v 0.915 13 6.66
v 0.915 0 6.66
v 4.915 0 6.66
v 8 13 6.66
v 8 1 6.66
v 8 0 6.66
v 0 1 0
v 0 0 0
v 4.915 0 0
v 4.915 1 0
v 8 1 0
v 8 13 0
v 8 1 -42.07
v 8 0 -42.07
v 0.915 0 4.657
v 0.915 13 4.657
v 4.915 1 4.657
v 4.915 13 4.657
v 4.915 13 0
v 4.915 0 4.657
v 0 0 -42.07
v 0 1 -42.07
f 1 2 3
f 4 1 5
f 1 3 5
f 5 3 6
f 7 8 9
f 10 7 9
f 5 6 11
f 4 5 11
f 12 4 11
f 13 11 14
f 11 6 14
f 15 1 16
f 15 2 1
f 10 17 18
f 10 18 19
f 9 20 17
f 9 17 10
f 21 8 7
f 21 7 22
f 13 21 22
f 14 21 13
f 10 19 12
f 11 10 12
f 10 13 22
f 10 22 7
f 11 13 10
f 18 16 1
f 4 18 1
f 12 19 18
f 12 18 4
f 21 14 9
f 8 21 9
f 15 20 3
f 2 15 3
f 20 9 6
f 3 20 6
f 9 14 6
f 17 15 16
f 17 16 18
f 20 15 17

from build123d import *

# Parameters (mm, degrees)
SCHIZZO1_W                   = 8
SCHIZZO1_H                   = 42.07
ESTRUSIONE_ESTRUSIONE1_DEPTH = 1
SCHIZZO2_W                   = 3.084803914
SCHIZZO2_H                   = 1
ESTRUSIONE_ESTRUSIONE2_DEPTH = 4.66
SCHIZZO3_W                   = 3.084803914
SCHIZZO3_H                   = 1
ESTRUSIONE_ESTRUSIONE3_DEPTH = 2
SCHIZZO4_W                   = 2.003143521
SCHIZZO4_H                   = 1
ESTRUSIONE_ESTRUSIONE4_DEPTH = 4
SCHIZZO5_W                   = 7.084803914
SCHIZZO5_H                   = 2.003143521
ESTRUSIONE_ESTRUSIONE5_DEPTH = 12
SCHIZZO7_W                   = 3.084803914
SCHIZZO7_H                   = 4.656856479
ESTRUSIONE_ESTRUSIONE7_DEPTH = 12


with BuildPart() as part:
    # Schizzo1 → Estrusione-Estrusione1 (new body)
    with BuildSketch(Plane(origin=(0, 0, 0), x_dir=(1, 0, 0), z_dir=(0, 1, 0))):
        with Locations((4, 21.035)):
            Rectangle(SCHIZZO1_W, SCHIZZO1_H)
    extrude(amount=ESTRUSIONE_ESTRUSIONE1_DEPTH)

    # Schizzo2 → Estrusione-Estrusione2 (add)
    with BuildSketch(Plane.XY):
        with Locations((6.457598043, 0.5)):
            Rectangle(SCHIZZO2_W, SCHIZZO2_H)
    extrude(amount=ESTRUSIONE_ESTRUSIONE2_DEPTH)

    # Schizzo3 → Estrusione-Estrusione3 (add)
    with BuildSketch(Plane.XY.offset(4.66)):
        with Locations((6.457598043, 0.5)):
            Rectangle(SCHIZZO3_W, SCHIZZO3_H)
    extrude(amount=ESTRUSIONE_ESTRUSIONE3_DEPTH)

    # Schizzo4 → Estrusione-Estrusione4 (add)
    with BuildSketch(Plane.ZY.offset(-4.915196086)):
        with Locations((5.65842824, 0.5)):
            Rectangle(SCHIZZO4_W, SCHIZZO4_H)
    extrude(amount=ESTRUSIONE_ESTRUSIONE4_DEPTH)

    # Schizzo5 → Estrusione-Estrusione5 (add)
    with BuildSketch(Plane(origin=(0, 1, 0), x_dir=(1, 0, 0), z_dir=(0, 1, 0))):
        with Locations((4.457598043, -5.65842824)):
            Rectangle(SCHIZZO5_W, SCHIZZO5_H)
    extrude(amount=ESTRUSIONE_ESTRUSIONE5_DEPTH)

    # Schizzo7 → Estrusione-Estrusione7 (add)
    with BuildSketch(Plane(origin=(0, 1, 0), x_dir=(1, 0, 0), z_dir=(0, 1, 0))):
        with Locations((6.457598043, -2.328428239)):
            Rectangle(SCHIZZO7_W, SCHIZZO7_H)
    extrude(amount=ESTRUSIONE_ESTRUSIONE7_DEPTH)


solid = part.part
